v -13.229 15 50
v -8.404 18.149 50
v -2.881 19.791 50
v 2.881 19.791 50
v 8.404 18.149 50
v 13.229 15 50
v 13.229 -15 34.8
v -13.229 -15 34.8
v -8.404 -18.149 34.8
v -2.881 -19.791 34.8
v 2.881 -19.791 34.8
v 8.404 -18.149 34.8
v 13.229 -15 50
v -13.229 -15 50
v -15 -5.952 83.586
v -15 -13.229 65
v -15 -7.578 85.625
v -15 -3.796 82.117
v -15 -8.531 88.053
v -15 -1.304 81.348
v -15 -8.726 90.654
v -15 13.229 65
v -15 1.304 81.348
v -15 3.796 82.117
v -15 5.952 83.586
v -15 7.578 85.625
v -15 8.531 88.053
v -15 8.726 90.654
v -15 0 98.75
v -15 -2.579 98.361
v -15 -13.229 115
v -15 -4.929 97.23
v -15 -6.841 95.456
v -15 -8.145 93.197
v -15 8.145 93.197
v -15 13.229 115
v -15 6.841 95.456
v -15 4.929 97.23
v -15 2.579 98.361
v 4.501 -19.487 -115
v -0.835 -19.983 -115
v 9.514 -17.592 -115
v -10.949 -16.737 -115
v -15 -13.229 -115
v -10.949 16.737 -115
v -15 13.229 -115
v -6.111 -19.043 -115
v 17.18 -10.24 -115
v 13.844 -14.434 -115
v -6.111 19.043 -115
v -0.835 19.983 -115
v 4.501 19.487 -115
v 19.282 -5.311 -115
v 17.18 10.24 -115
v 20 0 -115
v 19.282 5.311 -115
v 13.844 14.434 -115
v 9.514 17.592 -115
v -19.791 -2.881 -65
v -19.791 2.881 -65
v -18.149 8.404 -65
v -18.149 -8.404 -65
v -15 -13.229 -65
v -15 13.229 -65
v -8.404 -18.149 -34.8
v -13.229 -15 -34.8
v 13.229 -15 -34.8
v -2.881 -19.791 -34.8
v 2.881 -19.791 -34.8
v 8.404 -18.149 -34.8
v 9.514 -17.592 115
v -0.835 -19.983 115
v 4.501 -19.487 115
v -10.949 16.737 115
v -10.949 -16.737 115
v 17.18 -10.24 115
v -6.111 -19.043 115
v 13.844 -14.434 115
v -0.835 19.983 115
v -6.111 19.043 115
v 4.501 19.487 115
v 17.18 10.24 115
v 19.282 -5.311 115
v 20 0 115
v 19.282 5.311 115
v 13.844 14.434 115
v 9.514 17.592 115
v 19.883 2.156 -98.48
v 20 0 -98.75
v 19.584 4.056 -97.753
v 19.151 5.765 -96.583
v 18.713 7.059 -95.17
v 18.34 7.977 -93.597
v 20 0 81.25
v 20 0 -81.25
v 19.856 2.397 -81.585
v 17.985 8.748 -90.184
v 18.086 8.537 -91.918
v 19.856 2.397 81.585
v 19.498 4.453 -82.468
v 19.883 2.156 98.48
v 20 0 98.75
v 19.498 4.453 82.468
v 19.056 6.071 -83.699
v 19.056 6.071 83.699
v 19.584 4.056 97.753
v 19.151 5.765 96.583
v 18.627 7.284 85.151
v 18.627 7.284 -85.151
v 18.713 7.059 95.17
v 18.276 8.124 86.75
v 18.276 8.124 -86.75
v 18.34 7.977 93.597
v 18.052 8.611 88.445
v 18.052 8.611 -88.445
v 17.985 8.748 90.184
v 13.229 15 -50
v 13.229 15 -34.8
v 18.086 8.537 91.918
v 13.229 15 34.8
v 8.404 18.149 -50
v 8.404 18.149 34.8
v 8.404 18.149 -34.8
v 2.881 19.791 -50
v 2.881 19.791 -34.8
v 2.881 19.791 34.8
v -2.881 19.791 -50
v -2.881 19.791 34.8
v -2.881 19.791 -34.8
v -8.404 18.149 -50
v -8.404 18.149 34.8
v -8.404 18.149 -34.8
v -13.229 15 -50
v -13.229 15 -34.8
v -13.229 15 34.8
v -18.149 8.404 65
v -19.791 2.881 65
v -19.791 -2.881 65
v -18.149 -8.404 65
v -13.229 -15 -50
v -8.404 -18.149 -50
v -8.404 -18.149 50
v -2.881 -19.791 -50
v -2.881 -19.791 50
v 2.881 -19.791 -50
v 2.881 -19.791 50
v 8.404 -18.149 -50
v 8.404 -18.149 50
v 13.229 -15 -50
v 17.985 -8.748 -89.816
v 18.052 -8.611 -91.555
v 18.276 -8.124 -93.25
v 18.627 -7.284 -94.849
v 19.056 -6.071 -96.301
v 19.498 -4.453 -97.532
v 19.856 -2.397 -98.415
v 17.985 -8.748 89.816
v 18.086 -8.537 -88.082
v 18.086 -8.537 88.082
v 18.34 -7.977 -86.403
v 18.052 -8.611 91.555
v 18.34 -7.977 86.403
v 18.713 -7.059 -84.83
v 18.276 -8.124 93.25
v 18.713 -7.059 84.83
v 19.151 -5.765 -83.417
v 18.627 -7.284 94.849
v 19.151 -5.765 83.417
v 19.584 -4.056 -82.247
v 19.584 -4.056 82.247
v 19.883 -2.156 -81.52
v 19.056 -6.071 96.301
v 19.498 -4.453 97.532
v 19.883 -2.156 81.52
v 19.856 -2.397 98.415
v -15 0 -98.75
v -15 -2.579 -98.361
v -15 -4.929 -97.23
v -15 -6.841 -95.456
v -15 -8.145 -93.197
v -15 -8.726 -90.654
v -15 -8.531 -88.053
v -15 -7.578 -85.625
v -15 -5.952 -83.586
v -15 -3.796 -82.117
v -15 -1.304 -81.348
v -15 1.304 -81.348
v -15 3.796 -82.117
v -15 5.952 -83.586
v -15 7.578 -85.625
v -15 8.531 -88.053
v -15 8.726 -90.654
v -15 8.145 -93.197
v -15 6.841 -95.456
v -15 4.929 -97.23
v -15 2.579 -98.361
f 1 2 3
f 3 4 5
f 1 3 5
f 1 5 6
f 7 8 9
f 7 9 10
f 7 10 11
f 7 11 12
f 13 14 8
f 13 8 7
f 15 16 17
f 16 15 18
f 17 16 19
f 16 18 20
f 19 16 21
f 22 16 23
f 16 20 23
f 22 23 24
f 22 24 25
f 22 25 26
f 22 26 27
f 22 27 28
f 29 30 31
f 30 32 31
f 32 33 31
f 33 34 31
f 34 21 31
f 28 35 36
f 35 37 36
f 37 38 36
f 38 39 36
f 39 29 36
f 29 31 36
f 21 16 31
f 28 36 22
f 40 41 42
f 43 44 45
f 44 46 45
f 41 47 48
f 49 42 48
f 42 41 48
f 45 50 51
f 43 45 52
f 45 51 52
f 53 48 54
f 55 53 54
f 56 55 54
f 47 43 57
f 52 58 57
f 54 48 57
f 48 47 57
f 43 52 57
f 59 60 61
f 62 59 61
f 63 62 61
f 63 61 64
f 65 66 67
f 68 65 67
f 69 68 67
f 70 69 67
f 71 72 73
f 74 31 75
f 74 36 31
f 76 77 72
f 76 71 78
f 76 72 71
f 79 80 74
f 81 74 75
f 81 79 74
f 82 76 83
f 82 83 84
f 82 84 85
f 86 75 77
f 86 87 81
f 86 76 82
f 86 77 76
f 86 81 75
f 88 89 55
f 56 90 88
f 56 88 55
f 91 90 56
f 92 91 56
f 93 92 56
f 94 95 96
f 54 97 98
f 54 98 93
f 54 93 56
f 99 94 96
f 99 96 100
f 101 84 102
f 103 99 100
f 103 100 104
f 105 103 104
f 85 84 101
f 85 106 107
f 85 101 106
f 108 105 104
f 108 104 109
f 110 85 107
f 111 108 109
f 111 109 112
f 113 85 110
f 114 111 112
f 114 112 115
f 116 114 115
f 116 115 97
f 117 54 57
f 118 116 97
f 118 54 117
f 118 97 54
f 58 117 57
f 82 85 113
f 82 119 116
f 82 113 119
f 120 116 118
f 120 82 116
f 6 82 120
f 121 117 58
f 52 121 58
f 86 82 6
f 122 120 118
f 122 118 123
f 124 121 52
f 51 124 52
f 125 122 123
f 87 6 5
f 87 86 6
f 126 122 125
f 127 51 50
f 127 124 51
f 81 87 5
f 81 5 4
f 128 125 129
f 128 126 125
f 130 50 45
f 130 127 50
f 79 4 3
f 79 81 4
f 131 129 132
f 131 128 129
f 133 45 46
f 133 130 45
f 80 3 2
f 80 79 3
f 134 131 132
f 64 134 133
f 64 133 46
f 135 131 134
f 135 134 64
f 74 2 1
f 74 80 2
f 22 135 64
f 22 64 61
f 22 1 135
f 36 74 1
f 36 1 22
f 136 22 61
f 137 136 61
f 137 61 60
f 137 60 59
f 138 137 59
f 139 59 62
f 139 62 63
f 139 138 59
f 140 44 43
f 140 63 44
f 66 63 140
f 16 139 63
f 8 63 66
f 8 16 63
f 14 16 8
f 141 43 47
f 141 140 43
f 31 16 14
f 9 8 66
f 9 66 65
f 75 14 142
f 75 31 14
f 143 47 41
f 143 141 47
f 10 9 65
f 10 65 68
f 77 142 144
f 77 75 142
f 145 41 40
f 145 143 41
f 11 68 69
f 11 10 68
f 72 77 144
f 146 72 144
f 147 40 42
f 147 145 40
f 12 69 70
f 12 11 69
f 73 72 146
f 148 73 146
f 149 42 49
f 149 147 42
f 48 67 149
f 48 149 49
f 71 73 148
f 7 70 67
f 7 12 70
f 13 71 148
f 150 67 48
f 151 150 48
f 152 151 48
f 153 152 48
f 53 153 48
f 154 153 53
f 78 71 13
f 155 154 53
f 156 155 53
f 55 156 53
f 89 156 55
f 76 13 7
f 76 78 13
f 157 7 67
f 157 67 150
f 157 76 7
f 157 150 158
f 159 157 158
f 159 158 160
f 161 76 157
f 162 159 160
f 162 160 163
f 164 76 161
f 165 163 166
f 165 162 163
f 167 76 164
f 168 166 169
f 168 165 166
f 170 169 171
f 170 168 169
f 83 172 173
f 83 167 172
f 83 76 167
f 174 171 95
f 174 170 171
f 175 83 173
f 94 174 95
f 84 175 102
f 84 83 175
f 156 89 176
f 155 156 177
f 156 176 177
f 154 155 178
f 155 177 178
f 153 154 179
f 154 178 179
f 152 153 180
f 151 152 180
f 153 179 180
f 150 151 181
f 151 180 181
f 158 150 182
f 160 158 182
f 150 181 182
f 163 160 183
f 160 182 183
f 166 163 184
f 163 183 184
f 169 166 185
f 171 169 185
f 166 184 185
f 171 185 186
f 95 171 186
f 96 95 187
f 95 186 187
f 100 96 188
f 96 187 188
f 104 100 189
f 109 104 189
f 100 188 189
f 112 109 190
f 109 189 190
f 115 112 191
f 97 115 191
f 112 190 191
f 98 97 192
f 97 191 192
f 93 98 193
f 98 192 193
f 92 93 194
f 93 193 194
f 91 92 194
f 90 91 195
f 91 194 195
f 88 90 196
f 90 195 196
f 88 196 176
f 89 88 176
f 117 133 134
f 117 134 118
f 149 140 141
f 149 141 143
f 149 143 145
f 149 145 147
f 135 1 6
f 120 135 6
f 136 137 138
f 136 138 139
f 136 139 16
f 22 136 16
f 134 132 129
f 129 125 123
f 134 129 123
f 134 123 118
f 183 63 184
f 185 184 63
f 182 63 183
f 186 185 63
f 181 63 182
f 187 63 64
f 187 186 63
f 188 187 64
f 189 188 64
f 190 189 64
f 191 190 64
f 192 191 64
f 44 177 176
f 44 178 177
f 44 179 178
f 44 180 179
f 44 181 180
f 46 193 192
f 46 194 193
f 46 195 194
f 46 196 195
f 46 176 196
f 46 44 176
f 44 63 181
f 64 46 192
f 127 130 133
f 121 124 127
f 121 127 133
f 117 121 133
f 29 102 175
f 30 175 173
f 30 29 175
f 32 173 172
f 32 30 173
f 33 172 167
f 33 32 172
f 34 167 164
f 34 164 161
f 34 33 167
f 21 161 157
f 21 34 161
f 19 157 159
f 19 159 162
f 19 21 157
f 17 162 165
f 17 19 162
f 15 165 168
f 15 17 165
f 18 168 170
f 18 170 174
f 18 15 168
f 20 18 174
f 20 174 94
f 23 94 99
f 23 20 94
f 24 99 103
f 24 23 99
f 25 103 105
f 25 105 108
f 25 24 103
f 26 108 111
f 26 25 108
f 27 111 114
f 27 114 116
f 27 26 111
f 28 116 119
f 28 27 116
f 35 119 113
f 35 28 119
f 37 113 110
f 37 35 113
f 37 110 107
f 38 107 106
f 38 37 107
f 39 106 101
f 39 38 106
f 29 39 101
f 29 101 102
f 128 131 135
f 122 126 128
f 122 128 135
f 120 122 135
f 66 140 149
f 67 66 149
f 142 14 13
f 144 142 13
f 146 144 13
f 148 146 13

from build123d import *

# Parameters (mm, degrees)
SKETCH_1_R           = 20
EXTRUDE_1_DEPTH      = 115
CUT_EXTRUDE_START    = -65
SKETCH_2_OUTSIDE_W   = 89.37
SKETCH_2_OUTSIDE_H   = 89.37
SKETCH_2_OUTSIDE_W_2 = 80.530626202
SKETCH_2_OUTSIDE_H_2 = 30
CUT_EXTRUDE_1_DEPTH  = 15.2
CUT_EXTRUDE_2_DEPTH  = 50


with BuildPart() as part:
    # 草图1 → 凸台-拉伸1 (new, symmetric)
    with BuildSketch(Plane.XY):
        Circle(SKETCH_1_R)
    extrude(amount=EXTRUDE_1_DEPTH, both=True)

    # 草图2 outside → 切除-拉伸1 (cut)
    with BuildSketch(Plane.XY.offset(115).offset(CUT_EXTRUDE_START)):
        Rectangle(SKETCH_2_OUTSIDE_W, SKETCH_2_OUTSIDE_H)
        Rectangle(SKETCH_2_OUTSIDE_W_2, SKETCH_2_OUTSIDE_H_2, mode=Mode.SUBTRACT)
    cut_extrude_1 = extrude(amount=-CUT_EXTRUDE_1_DEPTH, mode=Mode.SUBTRACT)

    # 草图3 → 切除-拉伸2 (cut)
    with BuildSketch(Plane.XY.offset(115)):
        Polygon((-15, -119.751298217), (-15, -13.228756555), (-15, 13.228756555), (-15, 119.751298217), (-228.045083324, 119.751298217), (-228.045083324, -119.751298217), align=None)
    cut_extrude_2 = extrude(amount=-CUT_EXTRUDE_2_DEPTH, mode=Mode.SUBTRACT)

    # 草图4 → M20 螺纹孔1 (revolve, cut)
    with BuildSketch(Plane(origin=(-15, 0, 90), x_dir=(0, 0, 1), z_dir=(0, 1, 0))):
        Polygon((0, 0), (0, 52.757530416), (8.75, 47.5), (8.75, 0), align=None)
    hole_wizard_m20_1 = revolve(axis=Axis((-21.35, 0, 90), (1, 0, 0)), mode=Mode.SUBTRACT)

    # 镜向1: 切除-拉伸1, 切除-拉伸2, M20 螺纹孔1 across plane
    add(cut_extrude_1.mirror(Plane.XY), mode=Mode.SUBTRACT)
    add(cut_extrude_2.mirror(Plane.XY), mode=Mode.SUBTRACT)
    add(hole_wizard_m20_1.mirror(Plane.XY), mode=Mode.SUBTRACT)


solid = part.part
